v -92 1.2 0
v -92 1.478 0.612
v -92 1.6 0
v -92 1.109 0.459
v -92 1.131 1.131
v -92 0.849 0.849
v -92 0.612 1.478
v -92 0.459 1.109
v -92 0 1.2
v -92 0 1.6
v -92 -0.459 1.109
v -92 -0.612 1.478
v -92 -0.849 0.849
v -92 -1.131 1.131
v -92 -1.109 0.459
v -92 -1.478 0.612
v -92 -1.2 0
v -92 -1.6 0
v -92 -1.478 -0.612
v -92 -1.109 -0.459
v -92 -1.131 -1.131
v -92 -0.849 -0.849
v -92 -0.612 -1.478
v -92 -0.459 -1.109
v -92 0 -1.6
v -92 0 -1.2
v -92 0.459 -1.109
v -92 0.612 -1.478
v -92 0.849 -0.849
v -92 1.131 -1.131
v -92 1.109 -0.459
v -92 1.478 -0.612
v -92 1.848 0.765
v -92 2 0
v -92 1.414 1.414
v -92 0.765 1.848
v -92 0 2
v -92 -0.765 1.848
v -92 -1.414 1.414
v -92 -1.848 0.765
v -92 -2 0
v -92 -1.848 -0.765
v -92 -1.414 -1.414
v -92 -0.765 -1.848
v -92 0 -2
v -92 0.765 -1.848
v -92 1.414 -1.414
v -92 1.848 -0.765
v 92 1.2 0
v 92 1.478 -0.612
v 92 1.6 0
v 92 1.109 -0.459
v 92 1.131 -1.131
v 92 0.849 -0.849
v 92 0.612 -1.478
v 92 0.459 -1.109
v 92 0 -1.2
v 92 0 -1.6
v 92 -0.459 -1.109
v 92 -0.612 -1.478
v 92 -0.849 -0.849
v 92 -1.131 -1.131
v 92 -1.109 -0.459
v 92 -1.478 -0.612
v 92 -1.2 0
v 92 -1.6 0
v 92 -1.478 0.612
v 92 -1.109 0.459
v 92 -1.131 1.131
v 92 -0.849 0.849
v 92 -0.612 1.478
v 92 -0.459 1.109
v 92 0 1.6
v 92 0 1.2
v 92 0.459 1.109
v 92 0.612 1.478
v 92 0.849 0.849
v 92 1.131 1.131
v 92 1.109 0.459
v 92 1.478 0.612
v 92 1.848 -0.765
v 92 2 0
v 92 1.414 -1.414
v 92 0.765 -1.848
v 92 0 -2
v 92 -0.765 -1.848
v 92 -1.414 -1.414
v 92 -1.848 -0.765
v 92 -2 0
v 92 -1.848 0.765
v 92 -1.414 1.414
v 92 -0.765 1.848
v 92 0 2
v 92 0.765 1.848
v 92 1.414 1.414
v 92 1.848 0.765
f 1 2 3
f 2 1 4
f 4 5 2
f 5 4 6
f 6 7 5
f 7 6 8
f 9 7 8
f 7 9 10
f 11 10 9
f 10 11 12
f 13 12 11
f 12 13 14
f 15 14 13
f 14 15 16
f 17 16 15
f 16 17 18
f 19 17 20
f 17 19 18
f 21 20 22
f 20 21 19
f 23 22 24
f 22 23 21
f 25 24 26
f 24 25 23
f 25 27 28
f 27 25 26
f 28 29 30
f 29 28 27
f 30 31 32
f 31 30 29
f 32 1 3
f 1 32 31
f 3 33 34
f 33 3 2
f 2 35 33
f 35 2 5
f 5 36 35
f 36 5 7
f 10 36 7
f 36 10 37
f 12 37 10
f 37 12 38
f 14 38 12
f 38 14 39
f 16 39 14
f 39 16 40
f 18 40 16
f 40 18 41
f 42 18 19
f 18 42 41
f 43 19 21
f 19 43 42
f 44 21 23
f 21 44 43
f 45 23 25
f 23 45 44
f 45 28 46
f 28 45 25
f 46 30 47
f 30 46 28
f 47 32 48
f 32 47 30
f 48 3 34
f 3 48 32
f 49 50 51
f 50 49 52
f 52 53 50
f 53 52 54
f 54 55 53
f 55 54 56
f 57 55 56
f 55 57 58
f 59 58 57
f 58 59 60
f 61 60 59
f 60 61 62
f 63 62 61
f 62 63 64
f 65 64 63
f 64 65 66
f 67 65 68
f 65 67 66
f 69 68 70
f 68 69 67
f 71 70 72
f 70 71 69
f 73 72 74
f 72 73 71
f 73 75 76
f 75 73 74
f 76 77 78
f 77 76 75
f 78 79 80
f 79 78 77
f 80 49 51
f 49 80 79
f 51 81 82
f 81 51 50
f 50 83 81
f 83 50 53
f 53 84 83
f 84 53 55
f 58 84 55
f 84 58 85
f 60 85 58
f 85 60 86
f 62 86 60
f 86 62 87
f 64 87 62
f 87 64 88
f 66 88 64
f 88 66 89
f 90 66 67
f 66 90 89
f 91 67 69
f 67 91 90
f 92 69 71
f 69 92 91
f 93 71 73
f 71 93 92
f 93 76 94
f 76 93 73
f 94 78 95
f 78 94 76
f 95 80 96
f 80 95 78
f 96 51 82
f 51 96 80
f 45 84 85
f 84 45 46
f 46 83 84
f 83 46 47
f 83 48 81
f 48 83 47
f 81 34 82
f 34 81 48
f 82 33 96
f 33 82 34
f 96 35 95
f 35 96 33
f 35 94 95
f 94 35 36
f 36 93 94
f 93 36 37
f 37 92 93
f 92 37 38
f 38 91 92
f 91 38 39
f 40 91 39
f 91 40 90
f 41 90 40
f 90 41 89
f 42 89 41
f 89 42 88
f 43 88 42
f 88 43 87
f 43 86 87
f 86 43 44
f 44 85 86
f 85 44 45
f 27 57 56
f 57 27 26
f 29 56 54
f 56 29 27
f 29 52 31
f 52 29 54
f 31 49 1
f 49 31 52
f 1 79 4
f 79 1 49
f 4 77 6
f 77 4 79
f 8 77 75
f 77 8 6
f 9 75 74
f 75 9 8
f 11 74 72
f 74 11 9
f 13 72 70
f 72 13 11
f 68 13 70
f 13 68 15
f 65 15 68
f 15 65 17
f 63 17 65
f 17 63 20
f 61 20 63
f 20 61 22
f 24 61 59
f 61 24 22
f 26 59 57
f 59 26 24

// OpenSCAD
// file: ../p/4-4cyli.scad
use <../lib.scad>
function ldraw_lib__4_4cyli() = [
// 0 Cylinder 1.0
// 0 Name: 4-4cyli.dat
// 0 Author: James Jessiman
// 0 !LDRAW_ORG Primitive UPDATE 2005-01
// 0 !LICENSE Licensed under CC BY 4.0 : see CAreadme.txt
// 
// 0 BFC CERTIFY CCW
  [0,"BFC","CERTIFY"],
  [0,"BFC","CCW"],
// 
// 0 !HISTORY 1998-12-15 [PTadmin] Official Update 1998-10
// 0 !HISTORY 2002-03-23 [sbliss] Added BFC statement; merged headers from files in distributions LDraw 0.27 and Complete.
// 0 !HISTORY 2002-04-25 [PTadmin] Official Update 2002-02
// 0 !HISTORY 2004-12-14 [guyvivan] BFC CCW
// 0 !HISTORY 2005-12-28 [PTadmin] Official Update 2005-01
// 0 !HISTORY 2007-06-24 [PTadmin] Header formatted for Contributor Agreement
// 0 !HISTORY 2008-07-01 [PTadmin] Official Update 2008-01
// 
// 
// 4 16 1 1 0 0.9239 1 0.3827 0.9239 0 0.3827 1 0 0
  [4,16,1,1,0,0.9239,1,0.3827,0.9239,0,0.3827,1,0,0],
// 5 24 1 0 0 1 1 0 0.9239 0 0.3827 0.9239 0 -0.3827
  [5,24,1,0,0,1,1,0,0.9239,0,0.3827,0.9239,0,-0.3827],
// 4 16 0.9239 1 0.3827 0.7071 1 0.7071 0.7071 0 0.7071 0.9239 0 0.3827
  [4,16,0.9239,1,0.3827,0.7071,1,0.7071,0.7071,0,0.7071,0.9239,0,0.3827],
// 5 24 0.9239 0 0.3827 0.9239 1 0.3827 0.7071 0 0.7071 1 0 0
  [5,24,0.9239,0,0.3827,0.9239,1,0.3827,0.7071,0,0.7071,1,0,0],
// 4 16 0.7071 1 0.7071 0.3827 1 0.9239 0.3827 0 0.9239 0.7071 0 0.7071
  [4,16,0.7071,1,0.7071,0.3827,1,0.9239,0.3827,0,0.9239,0.7071,0,0.7071],
// 5 24 0.7071 0 0.7071 0.7071 1 0.7071 0.3827 0 0.9239 0.9239 0 0.3827
  [5,24,0.7071,0,0.7071,0.7071,1,0.7071,0.3827,0,0.9239,0.9239,0,0.3827],
// 4 16 0.3827 1 0.9239 0 1 1 0 0 1 0.3827 0 0.9239
  [4,16,0.3827,1,0.9239,0,1,1,0,0,1,0.3827,0,0.9239],
// 5 24 0.3827 0 0.9239 0.3827 1 0.9239 0 0 1 0.7071 0 0.7071
  [5,24,0.3827,0,0.9239,0.3827,1,0.9239,0,0,1,0.7071,0,0.7071],
// 4 16 0 1 1 -0.3827 1 0.9239 -0.3827 0 0.9239 0 0 1
  [4,16,0,1,1,-0.3827,1,0.9239,-0.3827,0,0.9239,0,0,1],
// 5 24 0 0 1 0 1 1 -0.3827 0 0.9239 0.3827 0 0.9239
  [5,24,0,0,1,0,1,1,-0.3827,0,0.9239,0.3827,0,0.9239],
// 4 16 -0.3827 1 0.9239 -0.7071 1 0.7071 -0.7071 0 0.7071 -0.3827 0 0.9239
  [4,16,-0.3827,1,0.9239,-0.7071,1,0.7071,-0.7071,0,0.7071,-0.3827,0,0.9239],
// 5 24 -0.3827 0 0.9239 -0.3827 1 0.9239 -0.7071 0 0.7071 0 0 1
  [5,24,-0.3827,0,0.9239,-0.3827,1,0.9239,-0.7071,0,0.7071,0,0,1],
// 4 16 -0.7071 1 0.7071 -0.9239 1 0.3827 -0.9239 0 0.3827 -0.7071 0 0.7071
  [4,16,-0.7071,1,0.7071,-0.9239,1,0.3827,-0.9239,0,0.3827,-0.7071,0,0.7071],
// 5 24 -0.7071 0 0.7071 -0.7071 1 0.7071 -0.9239 0 0.3827 -0.3827 0 0.9239
  [5,24,-0.7071,0,0.7071,-0.7071,1,0.7071,-0.9239,0,0.3827,-0.3827,0,0.9239],
// 4 16 -0.9239 1 0.3827 -1 1 0 -1 0 0 -0.9239 0 0.3827
  [4,16,-0.9239,1,0.3827,-1,1,0,-1,0,0,-0.9239,0,0.3827],
// 5 24 -0.9239 0 0.3827 -0.9239 1 0.3827 -1 0 0 -0.7071 0 0.7071
  [5,24,-0.9239,0,0.3827,-0.9239,1,0.3827,-1,0,0,-0.7071,0,0.7071],
// 4 16 -1 1 0 -0.9239 1 -0.3827 -0.9239 0 -0.3827 -1 0 0
  [4,16,-1,1,0,-0.9239,1,-0.3827,-0.9239,0,-0.3827,-1,0,0],
// 5 24 -1 0 0 -1 1 0 -0.9239 0 -0.3827 -0.9239 0 0.3827
  [5,24,-1,0,0,-1,1,0,-0.9239,0,-0.3827,-0.9239,0,0.3827],
// 4 16 -0.9239 1 -0.3827 -0.7071 1 -0.7071 -0.7071 0 -0.7071 -0.9239 0 -0.3827
  [4,16,-0.9239,1,-0.3827,-0.7071,1,-0.7071,-0.7071,0,-0.7071,-0.9239,0,-0.3827],
// 5 24 -0.9239 0 -0.3827 -0.9239 1 -0.3827 -0.7071 0 -0.7071 -1 0 0
  [5,24,-0.9239,0,-0.3827,-0.9239,1,-0.3827,-0.7071,0,-0.7071,-1,0,0],
// 4 16 -0.7071 1 -0.7071 -0.3827 1 -0.9239 -0.3827 0 -0.9239 -0.7071 0 -0.7071
  [4,16,-0.7071,1,-0.7071,-0.3827,1,-0.9239,-0.3827,0,-0.9239,-0.7071,0,-0.7071],
// 5 24 -0.7071 0 -0.7071 -0.7071 1 -0.7071 -0.3827 0 -0.9239 -0.9239 0 -0.3827
  [5,24,-0.7071,0,-0.7071,-0.7071,1,-0.7071,-0.3827,0,-0.9239,-0.9239,0,-0.3827],
// 4 16 -0.3827 1 -0.9239 0 1 -1 0 0 -1 -0.3827 0 -0.9239
  [4,16,-0.3827,1,-0.9239,0,1,-1,0,0,-1,-0.3827,0,-0.9239],
// 5 24 -0.3827 0 -0.9239 -0.3827 1 -0.9239 0 0 -1 -0.7071 0 -0.7071
  [5,24,-0.3827,0,-0.9239,-0.3827,1,-0.9239,0,0,-1,-0.7071,0,-0.7071],
// 4 16 0 1 -1 0.3827 1 -0.9239 0.3827 0 -0.9239 0 0 -1
  [4,16,0,1,-1,0.3827,1,-0.9239,0.3827,0,-0.9239,0,0,-1],
// 5 24 0 0 -1 0 1 -1 0.3827 0 -0.9239 -0.3827 0 -0.9239
  [5,24,0,0,-1,0,1,-1,0.3827,0,-0.9239,-0.3827,0,-0.9239],
// 4 16 0.3827 1 -0.9239 0.7071 1 -0.7071 0.7071 0 -0.7071 0.3827 0 -0.9239
  [4,16,0.3827,1,-0.9239,0.7071,1,-0.7071,0.7071,0,-0.7071,0.3827,0,-0.9239],
// 5 24 0.3827 0 -0.9239 0.3827 1 -0.9239 0.7071 0 -0.7071 0 0 -1
  [5,24,0.3827,0,-0.9239,0.3827,1,-0.9239,0.7071,0,-0.7071,0,0,-1],
// 4 16 0.7071 1 -0.7071 0.9239 1 -0.3827 0.9239 0 -0.3827 0.7071 0 -0.7071
  [4,16,0.7071,1,-0.7071,0.9239,1,-0.3827,0.9239,0,-0.3827,0.7071,0,-0.7071],
// 5 24 0.7071 0 -0.7071 0.7071 1 -0.7071 0.9239 0 -0.3827 0.3827 0 -0.9239
  [5,24,0.7071,0,-0.7071,0.7071,1,-0.7071,0.9239,0,-0.3827,0.3827,0,-0.9239],
// 4 16 0.9239 1 -0.3827 1 1 0 1 0 0 0.9239 0 -0.3827
  [4,16,0.9239,1,-0.3827,1,1,0,1,0,0,0.9239,0,-0.3827],
// 5 24 0.9239 0 -0.3827 0.9239 1 -0.3827 1 0 0 0.7071 0 -0.7071
  [5,24,0.9239,0,-0.3827,0.9239,1,-0.3827,1,0,0,0.7071,0,-0.7071],
// 0
];
module ldraw_lib__4_4cyli(step=0, col=false, unit=2/5, alt=false, line=0.2, solid=!$preview)
    makepoly(ldraw_lib__4_4cyli(), step=step, col=col, unit=unit, alt=alt, line=line, solid=solid);
ldraw_lib__4_4cyli(line=0.2);
// file: ../p/4-4ring4.scad
use <../lib.scad>
function ldraw_lib__4_4ring4() = [
// 0 Ring  4 x 1.0
// 0 Name: 4-4ring4.dat
// 0 Author: James Jessiman
// 0 !LDRAW_ORG Primitive UPDATE 2009-01
// 0 !LICENSE Licensed under CC BY 4.0 : see CAreadme.txt
// 
// 0 BFC CERTIFY CCW
  [0,"BFC","CERTIFY"],
  [0,"BFC","CCW"],
// 
// 0 !HISTORY 1998-12-15 [PTadmin] Official Update 1998-10
// 0 !HISTORY 2002-04-08 [BrickCaster] Modified for BFC compliance
// 0 !HISTORY 2002-04-25 [PTadmin] Official Update 2002-02
// 0 !HISTORY 2007-06-24 [PTadmin] Header formatted for Contributor Agreement
// 0 !HISTORY 2008-07-01 [PTadmin] Official Update 2008-01
// 0 !HISTORY 2008-08-26 [cwdee] Switch polygon winding and rename
// 0 !HISTORY 2009-05-02 [PTadmin] Official Update 2009-01
// 
// 
// 4 16 -1.9135 0 4.6195 -1.5308 0 3.6956 0 0 4 0 0 5
  [4,16,-1.9135,0,4.6195,-1.5308,0,3.6956,0,0,4,0,0,5],
// 4 16 -3.5355 0 3.5355 -2.8284 0 2.8284 -1.5308 0 3.6956 -1.9135 0 4.6195
  [4,16,-3.5355,0,3.5355,-2.8284,0,2.8284,-1.5308,0,3.6956,-1.9135,0,4.6195],
// 4 16 -4.6195 0 1.9135 -3.6956 0 1.5308 -2.8284 0 2.8284 -3.5355 0 3.5355
  [4,16,-4.6195,0,1.9135,-3.6956,0,1.5308,-2.8284,0,2.8284,-3.5355,0,3.5355],
// 4 16 -5 0 0 -4 0 0 -3.6956 0 1.5308 -4.6195 0 1.9135
  [4,16,-5,0,0,-4,0,0,-3.6956,0,1.5308,-4.6195,0,1.9135],
// 4 16 -4.6195 0 -1.9135 -3.6956 0 -1.5308 -4 0 0 -5 0 0
  [4,16,-4.6195,0,-1.9135,-3.6956,0,-1.5308,-4,0,0,-5,0,0],
// 4 16 -3.5355 0 -3.5355 -2.8284 0 -2.8284 -3.6956 0 -1.5308 -4.6195 0 -1.9135
  [4,16,-3.5355,0,-3.5355,-2.8284,0,-2.8284,-3.6956,0,-1.5308,-4.6195,0,-1.9135],
// 4 16 -1.9135 0 -4.6195 -1.5308 0 -3.6956 -2.8284 0 -2.8284 -3.5355 0 -3.5355
  [4,16,-1.9135,0,-4.6195,-1.5308,0,-3.6956,-2.8284,0,-2.8284,-3.5355,0,-3.5355],
// 4 16 0 0 -5 0 0 -4 -1.5308 0 -3.6956 -1.9135 0 -4.6195
  [4,16,0,0,-5,0,0,-4,-1.5308,0,-3.6956,-1.9135,0,-4.6195],
// 4 16 1.9135 0 -4.6195 1.5308 0 -3.6956 0 0 -4 0 0 -5
  [4,16,1.9135,0,-4.6195,1.5308,0,-3.6956,0,0,-4,0,0,-5],
// 4 16 3.5355 0 -3.5355 2.8284 0 -2.8284 1.5308 0 -3.6956 1.9135 0 -4.6195
  [4,16,3.5355,0,-3.5355,2.8284,0,-2.8284,1.5308,0,-3.6956,1.9135,0,-4.6195],
// 4 16 4.6195 0 -1.9135 3.6956 0 -1.5308 2.8284 0 -2.8284 3.5355 0 -3.5355
  [4,16,4.6195,0,-1.9135,3.6956,0,-1.5308,2.8284,0,-2.8284,3.5355,0,-3.5355],
// 4 16 5 0 0 4 0 0 3.6956 0 -1.5308 4.6195 0 -1.9135
  [4,16,5,0,0,4,0,0,3.6956,0,-1.5308,4.6195,0,-1.9135],
// 4 16 4.6195 0 1.9135 3.6956 0 1.5308 4 0 0 5 0 0
  [4,16,4.6195,0,1.9135,3.6956,0,1.5308,4,0,0,5,0,0],
// 4 16 3.5355 0 3.5355 2.8284 0 2.8284 3.6956 0 1.5308 4.6195 0 1.9135
  [4,16,3.5355,0,3.5355,2.8284,0,2.8284,3.6956,0,1.5308,4.6195,0,1.9135],
// 4 16 1.9135 0 4.6195 1.5308 0 3.6956 2.8284 0 2.8284 3.5355 0 3.5355
  [4,16,1.9135,0,4.6195,1.5308,0,3.6956,2.8284,0,2.8284,3.5355,0,3.5355],
// 4 16 0 0 5 0 0 4 1.5308 0 3.6956 1.9135 0 4.6195
  [4,16,0,0,5,0,0,4,1.5308,0,3.6956,1.9135,0,4.6195],
// 0
];
module ldraw_lib__4_4ring4(step=0, col=false, unit=2/5, alt=false, line=0.2, solid=!$preview)
    makepoly(ldraw_lib__4_4ring4(), step=step, col=col, unit=unit, alt=alt, line=line, solid=solid);
ldraw_lib__4_4ring4(line=0.2);
// file: ../p/4-4ring3.scad
use <../lib.scad>
function ldraw_lib__4_4ring3() = [
// 0 Ring  3 x 1.0
// 0 Name: 4-4ring3.dat
// 0 Author: James Jessiman
// 0 !LDRAW_ORG Primitive UPDATE 2009-01
// 0 !LICENSE Licensed under CC BY 4.0 : see CAreadme.txt
// 
// 0 BFC CERTIFY CCW
  [0,"BFC","CERTIFY"],
  [0,"BFC","CCW"],
// 
// 0 !HISTORY 1998-12-15 [PTadmin] Official Update 1998-10
// 0 !HISTORY 2002-04-05 [hafhead] Added BFC statement
// 0 !HISTORY 2002-04-25 [PTadmin] Official Update 2002-02
// 0 !HISTORY 2007-06-24 [PTadmin] Header formatted for Contributor Agreement
// 0 !HISTORY 2008-07-01 [PTadmin] Official Update 2008-01
// 0 !HISTORY 2008-08-26 [cwdee] Switch polygon winding and rename
// 0 !HISTORY 2009-05-02 [PTadmin] Official Update 2009-01
// 
// 
// 4 16 -1.5308 0 3.6956 -1.1481 0 2.7717 0 0 3 0 0 4
  [4,16,-1.5308,0,3.6956,-1.1481,0,2.7717,0,0,3,0,0,4],
// 4 16 -2.8284 0 2.8284 -2.1213 0 2.1213 -1.1481 0 2.7717 -1.5308 0 3.6956
  [4,16,-2.8284,0,2.8284,-2.1213,0,2.1213,-1.1481,0,2.7717,-1.5308,0,3.6956],
// 4 16 -3.6956 0 1.5308 -2.7717 0 1.1481 -2.1213 0 2.1213 -2.8284 0 2.8284
  [4,16,-3.6956,0,1.5308,-2.7717,0,1.1481,-2.1213,0,2.1213,-2.8284,0,2.8284],
// 4 16 -4 0 0 -3 0 0 -2.7717 0 1.1481 -3.6956 0 1.5308
  [4,16,-4,0,0,-3,0,0,-2.7717,0,1.1481,-3.6956,0,1.5308],
// 4 16 -3.6956 0 -1.5308 -2.7717 0 -1.1481 -3 0 0 -4 0 0
  [4,16,-3.6956,0,-1.5308,-2.7717,0,-1.1481,-3,0,0,-4,0,0],
// 4 16 -2.8284 0 -2.8284 -2.1213 0 -2.1213 -2.7717 0 -1.1481 -3.6956 0 -1.5308
  [4,16,-2.8284,0,-2.8284,-2.1213,0,-2.1213,-2.7717,0,-1.1481,-3.6956,0,-1.5308],
// 4 16 -1.5308 0 -3.6956 -1.1481 0 -2.7717 -2.1213 0 -2.1213 -2.8284 0 -2.8284
  [4,16,-1.5308,0,-3.6956,-1.1481,0,-2.7717,-2.1213,0,-2.1213,-2.8284,0,-2.8284],
// 4 16 0 0 -4 0 0 -3 -1.1481 0 -2.7717 -1.5308 0 -3.6956
  [4,16,0,0,-4,0,0,-3,-1.1481,0,-2.7717,-1.5308,0,-3.6956],
// 4 16 1.5308 0 -3.6956 1.1481 0 -2.7717 0 0 -3 0 0 -4
  [4,16,1.5308,0,-3.6956,1.1481,0,-2.7717,0,0,-3,0,0,-4],
// 4 16 2.8284 0 -2.8284 2.1213 0 -2.1213 1.1481 0 -2.7717 1.5308 0 -3.6956
  [4,16,2.8284,0,-2.8284,2.1213,0,-2.1213,1.1481,0,-2.7717,1.5308,0,-3.6956],
// 4 16 3.6956 0 -1.5308 2.7717 0 -1.1481 2.1213 0 -2.1213 2.8284 0 -2.8284
  [4,16,3.6956,0,-1.5308,2.7717,0,-1.1481,2.1213,0,-2.1213,2.8284,0,-2.8284],
// 4 16 4 0 0 3 0 0 2.7717 0 -1.1481 3.6956 0 -1.5308
  [4,16,4,0,0,3,0,0,2.7717,0,-1.1481,3.6956,0,-1.5308],
// 4 16 3.6956 0 1.5308 2.7717 0 1.1481 3 0 0 4 0 0
  [4,16,3.6956,0,1.5308,2.7717,0,1.1481,3,0,0,4,0,0],
// 4 16 2.8284 0 2.8284 2.1213 0 2.1213 2.7717 0 1.1481 3.6956 0 1.5308
  [4,16,2.8284,0,2.8284,2.1213,0,2.1213,2.7717,0,1.1481,3.6956,0,1.5308],
// 4 16 1.5308 0 3.6956 1.1481 0 2.7717 2.1213 0 2.1213 2.8284 0 2.8284
  [4,16,1.5308,0,3.6956,1.1481,0,2.7717,2.1213,0,2.1213,2.8284,0,2.8284],
// 4 16 0 0 4 0 0 3 1.1481 0 2.7717 1.5308 0 3.6956
  [4,16,0,0,4,0,0,3,1.1481,0,2.7717,1.5308,0,3.6956],
// 0
];
module ldraw_lib__4_4ring3(step=0, col=false, unit=2/5, alt=false, line=0.2, solid=!$preview)
    makepoly(ldraw_lib__4_4ring3(), step=step, col=col, unit=unit, alt=alt, line=line, solid=solid);
ldraw_lib__4_4ring3(line=0.2);
// file: ../p/4-4edge.scad
use <../lib.scad>
function ldraw_lib__4_4edge() = [
// 0 Circle 1.0
// 0 Name: 4-4edge.dat
// 0 Author: James Jessiman
// 0 !LDRAW_ORG Primitive UPDATE 2017-01
// 0 !LICENSE Licensed under CC BY 4.0 : see CAreadme.txt
// 
// 0 BFC CERTIFY CCW
  [0,"BFC","CERTIFY"],
  [0,"BFC","CCW"],
// 
// 0 !HISTORY 1998-12-15 [PTadmin] Official Update 1998-10
// 0 !HISTORY 2005-12-28 [PTadmin] Official Update 2005-01
// 0 !HISTORY 2007-06-24 [PTadmin] Header formatted for Contributor Agreement
// 0 !HISTORY 2008-07-01 [PTadmin] Official Update 2008-01
// 0 !HISTORY 2017-01-15 [Steffen] BFCed
// 0 !HISTORY 2017-12-30 [PTadmin] Official Update 2017-01
// 
// 
// 2 24 1 0 0 0.9239 0 0.3827
  [2,24,1,0,0,0.9239,0,0.3827],
// 2 24 0.9239 0 0.3827 0.7071 0 0.7071
  [2,24,0.9239,0,0.3827,0.7071,0,0.7071],
// 2 24 0.7071 0 0.7071 0.3827 0 0.9239
  [2,24,0.7071,0,0.7071,0.3827,0,0.9239],
// 2 24 0.3827 0 0.9239 0 0 1
  [2,24,0.3827,0,0.9239,0,0,1],
// 2 24 0 0 1 -0.3827 0 0.9239
  [2,24,0,0,1,-0.3827,0,0.9239],
// 2 24 -0.3827 0 0.9239 -0.7071 0 0.7071
  [2,24,-0.3827,0,0.9239,-0.7071,0,0.7071],
// 2 24 -0.7071 0 0.7071 -0.9239 0 0.3827
  [2,24,-0.7071,0,0.7071,-0.9239,0,0.3827],
// 2 24 -0.9239 0 0.3827 -1 0 -0
  [2,24,-0.9239,0,0.3827,-1,0,-0],
// 2 24 -1 0 -0 -0.9239 0 -0.3827
  [2,24,-1,0,-0,-0.9239,0,-0.3827],
// 2 24 -0.9239 0 -0.3827 -0.7071 0 -0.7071
  [2,24,-0.9239,0,-0.3827,-0.7071,0,-0.7071],
// 2 24 -0.7071 0 -0.7071 -0.3827 0 -0.9239
  [2,24,-0.7071,0,-0.7071,-0.3827,0,-0.9239],
// 2 24 -0.3827 0 -0.9239 0 0 -1
  [2,24,-0.3827,0,-0.9239,0,0,-1],
// 2 24 0 0 -1 0.3827 0 -0.9239
  [2,24,0,0,-1,0.3827,0,-0.9239],
// 2 24 0.3827 0 -0.9239 0.7071 0 -0.7071
  [2,24,0.3827,0,-0.9239,0.7071,0,-0.7071],
// 2 24 0.7071 0 -0.7071 0.9239 0 -0.3827
  [2,24,0.7071,0,-0.7071,0.9239,0,-0.3827],
// 2 24 0.9239 0 -0.3827 1 0 0
  [2,24,0.9239,0,-0.3827,1,0,0],
];
module ldraw_lib__4_4edge(step=0, col=false, unit=2/5, alt=false, line=0.2, solid=!$preview)
    makepoly(ldraw_lib__4_4edge(), step=step, col=col, unit=unit, alt=alt, line=line, solid=solid);
ldraw_lib__4_4edge(line=0.2);
// file: 71533k03.scad
use <../lib.scad>
use <../p/4-4cyli.scad>
function ldraw_lib__71533k03() = [
// 0 ~Technic Pneumatic Tube Segment
// 0 Name: 71533k03.dat
// 0 Author: Jaco van der Molen [Jaco]
// 0 !LDRAW_ORG Part Flexible_Section UPDATE 2020-01
// 0 !LICENSE Licensed under CC BY 4.0 : see CAreadme.txt
// 
// 0 BFC CERTIFY CW
  [0,"BFC","CERTIFY"],
  [0,"BFC","CW"],
// 
// 0 !HISTORY 2003-11-30 [Steffen] BFCed
// 0 !HISTORY 2009-12-29 [PTadmin] Official Update 2009-03
// 0 !HISTORY 2020-06-27 [PTadmin] Renamed from 166
// 0 !HISTORY 2020-06-28 [PTadmin] Official Update 2020-01
// 
// 
// 1 16 0 0 0 5 0 0 0 1 0 0 0 5 4-4cyli.dat
  [1,16,0,0,0,5,0,0,0,1,0,0,0,5, ldraw_lib__4_4cyli()],
// 0 BFC INVERTNEXT
  [0,"BFC","INVERTNEXT"],
// 1 16 0 0 0 3 0 0 0 1 0 0 0 3 4-4cyli.dat
  [1,16,0,0,0,3,0,0,0,1,0,0,0,3, ldraw_lib__4_4cyli()],
// 0
];
module ldraw_lib__71533k03(step=0, col=false, unit=2/5, alt=false, line=0.2, solid=!$preview)
    makepoly(ldraw_lib__71533k03(), step=step, col=col, unit=unit, alt=alt, line=line, solid=solid);
ldraw_lib__71533k03(line=0.2);
// file: 71533k02.scad
use <../lib.scad>
use <../p/4-4edge.scad>
use <../p/4-4ring3.scad>
use <../p/4-4ring4.scad>
function ldraw_lib__71533k02() = [
// 0 ~Technic Pneumatic Tube End (Non-Bulged)
// 0 Name: 71533k02.dat
// 0 Author: Steffen [Steffen]
// 0 !LDRAW_ORG Part Flexible_Section UPDATE 2020-01
// 0 !LICENSE Licensed under CC BY 4.0 : see CAreadme.txt
// 
// 0 BFC CERTIFY CCW
  [0,"BFC","CERTIFY"],
  [0,"BFC","CCW"],
// 
// 0 !HISTORY 2020-06-28 [PTadmin] Official Update 2020-01
// 
// 
// 0 // This file goes together with 71533k01.dat and 71533k03.dat.
// 0 // Those 3 files can be used to create Technic Pneumatic Tubes
// 0 // with either bulged or non-bulged ends.
// 
// 1 16 0 0 0 1 0 0 0 1 0 0 0 1 4-4ring3.dat
  [1,16,0,0,0,1,0,0,0,1,0,0,0,1, ldraw_lib__4_4ring3()],
// 1 16 0 0 0 1 0 0 0 1 0 0 0 1 4-4ring4.dat
  [1,16,0,0,0,1,0,0,0,1,0,0,0,1, ldraw_lib__4_4ring4()],
// 1 16 0 0 0 3 0 0 0 3 0 0 0 3 4-4edge.dat
  [1,16,0,0,0,3,0,0,0,3,0,0,0,3, ldraw_lib__4_4edge()],
// 1 16 0 0 0 5 0 0 0 5 0 0 0 5 4-4edge.dat
  [1,16,0,0,0,5,0,0,0,5,0,0,0,5, ldraw_lib__4_4edge()],
];
module ldraw_lib__71533k02(step=0, col=false, unit=2/5, alt=false, line=0.2, solid=!$preview)
    makepoly(ldraw_lib__71533k02(), step=step, col=col, unit=unit, alt=alt, line=line, solid=solid);
ldraw_lib__71533k02(line=0.2);
// main file
use <../lib.scad>
use <71533k02.scad>
use <71533k03.scad>
function ldraw_lib__26436_f1() = [
// 0 Technic Pneumatic Tube 23L
// 0 Name: 26436-f1.dat
// 0 Author: Philippe Hurbain [Philo]
// 0 !LDRAW_ORG Part UPDATE 2020-02
// 0 !LICENSE Licensed under CC BY 4.0 : see CAreadme.txt
// 
// 0 BFC CERTIFY CCW
  [0,"BFC","CERTIFY"],
  [0,"BFC","CCW"],
// 
// 0 !KEYWORDS 184 mm, BrickLink 26436, Rebrickable 5102c23
// 
// 0 !HISTORY 2020-09-05 [PTadmin] Official Update 2020-02
// 
// 
// 1 16 -230 0 0 0 1 0 1 0 0 0 0 1 71533k02.dat
  [1,16,-230,0,0,0,1,0,1,0,0,0,0,1, ldraw_lib__71533k02()],
// 1 16 230 0 0 0 -1 0 -1 0 0 0 0 1 71533k02.dat
  [1,16,230,0,0,0,-1,0,-1,0,0,0,0,1, ldraw_lib__71533k02()],
// 1 16 -230 0 0 0 460 0 1 0 0 0 0 1 71533k03.dat
  [1,16,-230,0,0,0,460,0,1,0,0,0,0,1, ldraw_lib__71533k03()],
];
module ldraw_lib__26436_f1(step=0, col=false, unit=2/5, alt=false, line=0.2, solid=!$preview)
    makepoly(ldraw_lib__26436_f1(), step=step, col=col, unit=unit, alt=alt, line=line, solid=solid);
ldraw_lib__26436_f1(line=0.2);
